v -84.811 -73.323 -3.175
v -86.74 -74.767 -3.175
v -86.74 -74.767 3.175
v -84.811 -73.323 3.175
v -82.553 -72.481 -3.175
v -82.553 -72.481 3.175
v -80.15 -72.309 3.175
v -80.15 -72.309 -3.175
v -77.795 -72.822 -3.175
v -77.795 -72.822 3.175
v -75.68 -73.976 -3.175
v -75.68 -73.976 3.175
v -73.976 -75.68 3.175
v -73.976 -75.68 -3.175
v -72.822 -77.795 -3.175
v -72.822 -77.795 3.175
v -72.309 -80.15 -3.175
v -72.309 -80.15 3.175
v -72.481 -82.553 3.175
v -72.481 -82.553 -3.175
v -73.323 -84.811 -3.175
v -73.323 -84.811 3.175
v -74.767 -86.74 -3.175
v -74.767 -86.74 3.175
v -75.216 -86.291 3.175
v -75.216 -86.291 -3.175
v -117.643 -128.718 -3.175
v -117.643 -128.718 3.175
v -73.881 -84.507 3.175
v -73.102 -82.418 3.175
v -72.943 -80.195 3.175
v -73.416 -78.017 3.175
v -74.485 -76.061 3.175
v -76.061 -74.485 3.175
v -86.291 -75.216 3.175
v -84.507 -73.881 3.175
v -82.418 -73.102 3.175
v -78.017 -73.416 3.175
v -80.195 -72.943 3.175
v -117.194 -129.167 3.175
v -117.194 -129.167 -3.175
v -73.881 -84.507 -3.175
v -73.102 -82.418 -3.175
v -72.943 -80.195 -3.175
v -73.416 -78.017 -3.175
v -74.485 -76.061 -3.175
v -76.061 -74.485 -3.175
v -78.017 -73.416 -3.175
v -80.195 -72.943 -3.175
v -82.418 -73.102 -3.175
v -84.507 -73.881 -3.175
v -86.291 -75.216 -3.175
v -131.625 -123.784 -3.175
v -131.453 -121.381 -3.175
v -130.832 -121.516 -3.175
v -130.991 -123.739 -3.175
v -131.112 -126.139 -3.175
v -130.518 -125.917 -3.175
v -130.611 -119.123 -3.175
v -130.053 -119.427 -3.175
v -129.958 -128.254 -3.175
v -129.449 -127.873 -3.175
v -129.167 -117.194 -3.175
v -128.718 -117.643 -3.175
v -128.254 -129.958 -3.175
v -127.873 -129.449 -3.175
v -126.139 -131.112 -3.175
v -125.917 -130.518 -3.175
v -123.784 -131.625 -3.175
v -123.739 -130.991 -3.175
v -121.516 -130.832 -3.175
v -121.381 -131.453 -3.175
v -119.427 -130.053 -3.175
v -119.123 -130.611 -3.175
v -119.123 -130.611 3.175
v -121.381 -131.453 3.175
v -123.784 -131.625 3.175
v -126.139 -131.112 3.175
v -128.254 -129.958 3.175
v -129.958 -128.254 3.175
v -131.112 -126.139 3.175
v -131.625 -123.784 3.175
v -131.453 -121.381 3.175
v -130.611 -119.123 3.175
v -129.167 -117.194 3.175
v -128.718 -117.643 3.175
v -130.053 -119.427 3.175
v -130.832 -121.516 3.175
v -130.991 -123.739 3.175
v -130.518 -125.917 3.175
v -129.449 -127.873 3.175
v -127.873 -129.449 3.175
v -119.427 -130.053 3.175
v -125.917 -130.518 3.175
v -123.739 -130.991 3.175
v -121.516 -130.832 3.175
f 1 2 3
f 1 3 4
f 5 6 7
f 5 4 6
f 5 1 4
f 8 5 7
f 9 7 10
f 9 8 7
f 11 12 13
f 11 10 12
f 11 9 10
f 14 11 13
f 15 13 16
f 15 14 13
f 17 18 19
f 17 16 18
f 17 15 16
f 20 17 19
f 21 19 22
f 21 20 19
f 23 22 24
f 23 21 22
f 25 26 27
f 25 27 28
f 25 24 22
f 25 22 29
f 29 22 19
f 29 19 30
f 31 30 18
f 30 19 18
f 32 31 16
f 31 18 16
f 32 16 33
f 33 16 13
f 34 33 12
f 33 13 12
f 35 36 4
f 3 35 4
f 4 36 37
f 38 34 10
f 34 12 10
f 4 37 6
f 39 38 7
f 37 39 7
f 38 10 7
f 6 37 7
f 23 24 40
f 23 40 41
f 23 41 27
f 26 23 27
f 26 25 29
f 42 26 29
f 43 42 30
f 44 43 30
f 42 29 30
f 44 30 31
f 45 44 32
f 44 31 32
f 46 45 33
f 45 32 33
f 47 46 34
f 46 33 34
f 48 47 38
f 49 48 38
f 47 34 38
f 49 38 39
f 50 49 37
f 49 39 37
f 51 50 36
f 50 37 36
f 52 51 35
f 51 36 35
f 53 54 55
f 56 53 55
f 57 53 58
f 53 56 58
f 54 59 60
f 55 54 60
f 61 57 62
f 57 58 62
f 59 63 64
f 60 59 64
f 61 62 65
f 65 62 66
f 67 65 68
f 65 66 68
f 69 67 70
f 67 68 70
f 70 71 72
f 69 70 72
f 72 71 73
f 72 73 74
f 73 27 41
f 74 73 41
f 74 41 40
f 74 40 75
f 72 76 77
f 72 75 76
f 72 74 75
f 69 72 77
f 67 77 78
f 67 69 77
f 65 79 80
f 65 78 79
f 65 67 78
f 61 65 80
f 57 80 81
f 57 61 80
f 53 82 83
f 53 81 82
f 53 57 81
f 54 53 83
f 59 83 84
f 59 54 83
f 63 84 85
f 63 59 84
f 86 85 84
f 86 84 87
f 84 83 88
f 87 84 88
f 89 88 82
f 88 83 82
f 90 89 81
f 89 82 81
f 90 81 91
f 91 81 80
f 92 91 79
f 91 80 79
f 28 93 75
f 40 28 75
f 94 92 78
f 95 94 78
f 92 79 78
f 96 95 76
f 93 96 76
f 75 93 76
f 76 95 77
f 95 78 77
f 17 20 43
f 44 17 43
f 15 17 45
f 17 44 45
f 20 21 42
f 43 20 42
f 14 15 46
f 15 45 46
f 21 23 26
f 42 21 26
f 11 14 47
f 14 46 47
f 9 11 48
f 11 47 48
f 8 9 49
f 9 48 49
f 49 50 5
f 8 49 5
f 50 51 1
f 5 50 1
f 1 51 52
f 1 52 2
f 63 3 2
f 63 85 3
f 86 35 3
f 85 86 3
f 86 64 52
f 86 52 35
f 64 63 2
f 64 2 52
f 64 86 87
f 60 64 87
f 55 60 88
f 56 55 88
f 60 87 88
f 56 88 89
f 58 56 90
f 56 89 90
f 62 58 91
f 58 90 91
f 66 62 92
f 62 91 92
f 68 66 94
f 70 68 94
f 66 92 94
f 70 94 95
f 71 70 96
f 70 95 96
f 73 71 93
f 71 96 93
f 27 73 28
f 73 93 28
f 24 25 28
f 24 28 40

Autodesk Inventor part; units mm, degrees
sketch "Sketch Path" plane through (0, 0, 0) normal (0, 0, 1) x (1, 0, 0)
  arc A0 (-128.8972, -117.4632) -> (-117.4632, -128.8972) centre (-123.1802, -123.1802) ccw
  arc A1 (-75.0368, -86.4708) -> (-86.4708, -75.0368) centre (-80.7538, -80.7538) ccw
  line L0 (-75.0368, -86.4708) -> (-117.4632, -128.8972)
  line L1 (-128.8972, -117.4632) -> (-86.4708, -75.0368)
ref_plane "Cross Section Plane" through (-117.4632, -128.8972, 0) normal (0.7071, 0.7071, 0) x (0, 0, 1)
ref_plane "Work Plane2" through (-123.1802, -123.1802, 0) normal (-1, 0, 0) x (0, 0, 1)
ref_plane "Work Plane3" through (-80.7538, -80.7538, 0) normal (-0.8049, -0.5934, 0) x (0, 0, 1)
sketch "Cross Section" plane through (-117.4632, -128.8972, 0) normal (0.7071, 0.7071, 0) x (0, 0, 1)
  line L0 (-3.175, 0.381) -> (3.175, 0.381)
  line L1 (3.175, 0.381) -> (3.175, -0.254)
  line L2 (3.175, -0.254) -> (-3.175, -0.254)
  line L3 (-3.175, -0.254) -> (-3.175, 0.381)
  line L4 (-3.175, 0) -> (3.175, 0) construction
  point P0 (0, 0)
  point P1 (0, 0)
  dimension "d0" = 6.35
  dimension "d4" = 0.254
  dimension "d5" = 0.381
sweep "Belt" add profiles "Cross Section" path "Sketch Path"
equation "\"d0\" = da_B"
equation "\"d4\" = da_a"
equation "\"d5\" = da_a2"
equation "\"da_B\" = 6.35"
equation "\"da_pb\" = 2.032"
equation "\"da_L\" = 170.8"
equation "\"da_a\" = 0.254"
equation "\"da_S\" = 1.143"
equation "\"da_Beta\" = 20deg"
equation "\"da_Ht\" = 0.508"
equation "\"da_H\" = 1.143"
equation "\"da_a2\" = 0.381"
properties part number "Synchronous Belt" material "Rubber"
